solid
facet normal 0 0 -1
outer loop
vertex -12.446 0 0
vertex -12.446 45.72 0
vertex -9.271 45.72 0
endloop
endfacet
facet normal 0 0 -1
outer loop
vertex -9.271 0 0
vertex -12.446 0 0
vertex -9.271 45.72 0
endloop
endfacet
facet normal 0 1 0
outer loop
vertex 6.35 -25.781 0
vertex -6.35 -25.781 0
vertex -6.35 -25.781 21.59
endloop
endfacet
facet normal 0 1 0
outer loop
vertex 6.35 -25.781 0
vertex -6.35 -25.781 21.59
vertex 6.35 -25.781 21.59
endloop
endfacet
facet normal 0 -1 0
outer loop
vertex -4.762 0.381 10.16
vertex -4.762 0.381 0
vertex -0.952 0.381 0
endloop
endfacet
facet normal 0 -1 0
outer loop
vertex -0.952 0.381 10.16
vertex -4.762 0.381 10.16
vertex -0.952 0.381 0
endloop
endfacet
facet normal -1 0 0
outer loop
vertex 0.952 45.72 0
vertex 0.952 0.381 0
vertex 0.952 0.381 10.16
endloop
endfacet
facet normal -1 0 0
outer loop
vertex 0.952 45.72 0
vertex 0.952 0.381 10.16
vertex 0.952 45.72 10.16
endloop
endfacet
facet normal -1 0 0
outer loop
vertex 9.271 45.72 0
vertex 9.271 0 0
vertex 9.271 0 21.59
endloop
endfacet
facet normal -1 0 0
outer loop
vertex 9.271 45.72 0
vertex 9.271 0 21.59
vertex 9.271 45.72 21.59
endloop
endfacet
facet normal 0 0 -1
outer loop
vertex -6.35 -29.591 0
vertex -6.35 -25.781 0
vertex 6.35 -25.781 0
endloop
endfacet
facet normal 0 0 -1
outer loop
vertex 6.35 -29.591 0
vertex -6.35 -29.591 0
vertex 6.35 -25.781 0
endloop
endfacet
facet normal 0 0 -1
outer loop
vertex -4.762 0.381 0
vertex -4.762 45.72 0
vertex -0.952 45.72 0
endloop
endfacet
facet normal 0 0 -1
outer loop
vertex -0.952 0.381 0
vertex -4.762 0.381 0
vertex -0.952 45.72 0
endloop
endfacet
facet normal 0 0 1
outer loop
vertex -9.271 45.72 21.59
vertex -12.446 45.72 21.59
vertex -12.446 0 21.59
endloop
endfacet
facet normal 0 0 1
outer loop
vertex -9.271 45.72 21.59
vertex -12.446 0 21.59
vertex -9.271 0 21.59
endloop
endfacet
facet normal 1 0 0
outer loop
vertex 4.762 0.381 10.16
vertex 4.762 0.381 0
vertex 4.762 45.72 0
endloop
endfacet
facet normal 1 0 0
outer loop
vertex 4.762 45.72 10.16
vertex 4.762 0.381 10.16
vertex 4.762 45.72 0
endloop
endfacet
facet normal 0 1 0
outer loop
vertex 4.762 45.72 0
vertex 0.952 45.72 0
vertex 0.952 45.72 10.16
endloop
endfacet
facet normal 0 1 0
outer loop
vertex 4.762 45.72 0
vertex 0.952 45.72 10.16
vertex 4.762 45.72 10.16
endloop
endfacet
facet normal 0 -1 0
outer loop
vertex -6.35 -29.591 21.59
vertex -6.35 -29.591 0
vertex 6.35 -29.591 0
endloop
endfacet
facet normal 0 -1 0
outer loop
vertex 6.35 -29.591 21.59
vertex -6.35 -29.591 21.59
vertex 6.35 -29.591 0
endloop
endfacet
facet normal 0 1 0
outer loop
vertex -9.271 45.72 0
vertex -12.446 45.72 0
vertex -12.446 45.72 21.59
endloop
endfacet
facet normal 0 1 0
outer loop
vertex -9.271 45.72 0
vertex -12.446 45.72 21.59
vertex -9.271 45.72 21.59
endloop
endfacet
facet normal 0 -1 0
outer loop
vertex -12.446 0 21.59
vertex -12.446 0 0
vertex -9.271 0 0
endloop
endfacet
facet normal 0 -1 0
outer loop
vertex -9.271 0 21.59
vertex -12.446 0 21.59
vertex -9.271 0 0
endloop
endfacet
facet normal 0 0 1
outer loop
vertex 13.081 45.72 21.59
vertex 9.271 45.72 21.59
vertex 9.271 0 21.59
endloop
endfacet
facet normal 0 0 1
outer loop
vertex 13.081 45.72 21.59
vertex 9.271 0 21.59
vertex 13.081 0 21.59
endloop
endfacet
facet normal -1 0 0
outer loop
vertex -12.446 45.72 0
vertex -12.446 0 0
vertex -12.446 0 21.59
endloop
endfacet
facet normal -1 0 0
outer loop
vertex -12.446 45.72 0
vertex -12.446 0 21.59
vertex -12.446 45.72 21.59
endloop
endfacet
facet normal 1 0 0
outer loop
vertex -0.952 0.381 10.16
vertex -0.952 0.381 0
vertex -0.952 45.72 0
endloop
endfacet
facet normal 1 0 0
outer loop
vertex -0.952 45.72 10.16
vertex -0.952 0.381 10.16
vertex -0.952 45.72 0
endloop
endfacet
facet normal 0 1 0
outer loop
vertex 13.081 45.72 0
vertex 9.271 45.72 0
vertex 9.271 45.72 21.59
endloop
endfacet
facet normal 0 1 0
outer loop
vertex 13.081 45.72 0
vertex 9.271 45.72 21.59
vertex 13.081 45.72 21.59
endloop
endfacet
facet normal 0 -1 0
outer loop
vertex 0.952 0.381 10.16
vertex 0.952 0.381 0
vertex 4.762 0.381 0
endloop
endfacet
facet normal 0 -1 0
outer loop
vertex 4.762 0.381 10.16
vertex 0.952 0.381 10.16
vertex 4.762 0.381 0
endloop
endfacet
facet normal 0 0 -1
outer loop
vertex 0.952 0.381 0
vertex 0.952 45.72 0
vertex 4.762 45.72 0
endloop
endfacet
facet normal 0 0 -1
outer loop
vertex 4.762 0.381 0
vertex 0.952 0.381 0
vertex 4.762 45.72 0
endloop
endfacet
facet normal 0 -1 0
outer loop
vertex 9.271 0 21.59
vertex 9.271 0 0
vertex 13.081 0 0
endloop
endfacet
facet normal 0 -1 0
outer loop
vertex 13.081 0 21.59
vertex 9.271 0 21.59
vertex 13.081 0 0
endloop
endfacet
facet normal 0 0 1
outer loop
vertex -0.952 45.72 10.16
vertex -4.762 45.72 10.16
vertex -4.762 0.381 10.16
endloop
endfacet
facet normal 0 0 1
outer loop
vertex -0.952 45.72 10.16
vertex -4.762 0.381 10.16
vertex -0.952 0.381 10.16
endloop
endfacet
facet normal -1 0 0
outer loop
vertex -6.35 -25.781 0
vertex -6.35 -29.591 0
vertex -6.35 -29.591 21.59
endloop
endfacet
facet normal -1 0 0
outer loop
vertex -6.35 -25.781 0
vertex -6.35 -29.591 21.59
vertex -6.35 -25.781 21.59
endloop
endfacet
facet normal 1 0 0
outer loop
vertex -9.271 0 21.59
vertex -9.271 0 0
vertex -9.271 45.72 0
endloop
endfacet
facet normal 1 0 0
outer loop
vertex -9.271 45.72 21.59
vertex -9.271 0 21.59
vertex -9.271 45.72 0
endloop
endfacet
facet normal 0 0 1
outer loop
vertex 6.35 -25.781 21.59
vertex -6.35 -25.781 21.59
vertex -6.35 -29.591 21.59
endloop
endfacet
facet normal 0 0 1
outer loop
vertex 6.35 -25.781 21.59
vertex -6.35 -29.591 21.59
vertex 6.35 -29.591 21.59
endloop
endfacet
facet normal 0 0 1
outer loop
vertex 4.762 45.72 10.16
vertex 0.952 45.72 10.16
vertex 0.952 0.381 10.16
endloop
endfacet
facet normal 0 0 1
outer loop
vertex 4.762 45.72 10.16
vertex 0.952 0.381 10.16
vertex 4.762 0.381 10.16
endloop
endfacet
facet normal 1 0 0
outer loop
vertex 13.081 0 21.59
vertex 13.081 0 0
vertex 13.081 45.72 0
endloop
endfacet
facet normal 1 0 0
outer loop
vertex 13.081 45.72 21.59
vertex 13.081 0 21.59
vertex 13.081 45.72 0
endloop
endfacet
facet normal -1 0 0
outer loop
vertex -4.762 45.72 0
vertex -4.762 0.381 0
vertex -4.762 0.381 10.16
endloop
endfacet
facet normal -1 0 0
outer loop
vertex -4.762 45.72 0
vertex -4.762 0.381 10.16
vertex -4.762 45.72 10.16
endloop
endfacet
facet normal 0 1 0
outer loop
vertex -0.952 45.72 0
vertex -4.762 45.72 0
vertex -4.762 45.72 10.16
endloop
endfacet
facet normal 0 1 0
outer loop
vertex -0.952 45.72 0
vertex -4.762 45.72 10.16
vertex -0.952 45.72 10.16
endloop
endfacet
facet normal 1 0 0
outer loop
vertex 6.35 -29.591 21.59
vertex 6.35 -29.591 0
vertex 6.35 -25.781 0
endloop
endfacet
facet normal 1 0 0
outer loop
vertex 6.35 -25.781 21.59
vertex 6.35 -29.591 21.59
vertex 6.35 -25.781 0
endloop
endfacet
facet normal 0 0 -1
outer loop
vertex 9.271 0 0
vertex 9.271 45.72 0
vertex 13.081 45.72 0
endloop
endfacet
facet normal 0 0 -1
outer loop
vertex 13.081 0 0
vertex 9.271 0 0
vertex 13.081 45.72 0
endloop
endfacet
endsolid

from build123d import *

# Parameters (mm, degrees)
F1_W     = 12.7
F1_H     = 3.81
F1_W_2   = 3.175
F1_H_2   = 45.72
F1_W_3   = 3.81
F2_DEPTH = 21.59
F1_H_3   = 45.339
F3_DEPTH = 10.16


with BuildPart() as f2:
    # F1 (on Top) → F2 (new body)
    with BuildSketch(Plane.XY):
        with Locations((0, -27.686)):
            Rectangle(F1_W, F1_H)
        with Locations((-10.8585, 22.86)):
            Rectangle(F1_W_2, F1_H_2)
        with Locations((11.176, 22.86)):
            Rectangle(F1_W_3, F1_H_2)
    extrude(amount=F2_DEPTH)


with BuildPart() as f3:
    # F1 (on Top) → F3 (new body)
    with BuildSketch(Plane.XY):
        with Locations((-2.8575, 23.0505)):
            Rectangle(F1_W_3, F1_H_3)
        with Locations((2.8575, 23.0505)):
            Rectangle(F1_W_3, F1_H_3)
    extrude(amount=F3_DEPTH)


solid = Compound([f2.part, f3.part])
